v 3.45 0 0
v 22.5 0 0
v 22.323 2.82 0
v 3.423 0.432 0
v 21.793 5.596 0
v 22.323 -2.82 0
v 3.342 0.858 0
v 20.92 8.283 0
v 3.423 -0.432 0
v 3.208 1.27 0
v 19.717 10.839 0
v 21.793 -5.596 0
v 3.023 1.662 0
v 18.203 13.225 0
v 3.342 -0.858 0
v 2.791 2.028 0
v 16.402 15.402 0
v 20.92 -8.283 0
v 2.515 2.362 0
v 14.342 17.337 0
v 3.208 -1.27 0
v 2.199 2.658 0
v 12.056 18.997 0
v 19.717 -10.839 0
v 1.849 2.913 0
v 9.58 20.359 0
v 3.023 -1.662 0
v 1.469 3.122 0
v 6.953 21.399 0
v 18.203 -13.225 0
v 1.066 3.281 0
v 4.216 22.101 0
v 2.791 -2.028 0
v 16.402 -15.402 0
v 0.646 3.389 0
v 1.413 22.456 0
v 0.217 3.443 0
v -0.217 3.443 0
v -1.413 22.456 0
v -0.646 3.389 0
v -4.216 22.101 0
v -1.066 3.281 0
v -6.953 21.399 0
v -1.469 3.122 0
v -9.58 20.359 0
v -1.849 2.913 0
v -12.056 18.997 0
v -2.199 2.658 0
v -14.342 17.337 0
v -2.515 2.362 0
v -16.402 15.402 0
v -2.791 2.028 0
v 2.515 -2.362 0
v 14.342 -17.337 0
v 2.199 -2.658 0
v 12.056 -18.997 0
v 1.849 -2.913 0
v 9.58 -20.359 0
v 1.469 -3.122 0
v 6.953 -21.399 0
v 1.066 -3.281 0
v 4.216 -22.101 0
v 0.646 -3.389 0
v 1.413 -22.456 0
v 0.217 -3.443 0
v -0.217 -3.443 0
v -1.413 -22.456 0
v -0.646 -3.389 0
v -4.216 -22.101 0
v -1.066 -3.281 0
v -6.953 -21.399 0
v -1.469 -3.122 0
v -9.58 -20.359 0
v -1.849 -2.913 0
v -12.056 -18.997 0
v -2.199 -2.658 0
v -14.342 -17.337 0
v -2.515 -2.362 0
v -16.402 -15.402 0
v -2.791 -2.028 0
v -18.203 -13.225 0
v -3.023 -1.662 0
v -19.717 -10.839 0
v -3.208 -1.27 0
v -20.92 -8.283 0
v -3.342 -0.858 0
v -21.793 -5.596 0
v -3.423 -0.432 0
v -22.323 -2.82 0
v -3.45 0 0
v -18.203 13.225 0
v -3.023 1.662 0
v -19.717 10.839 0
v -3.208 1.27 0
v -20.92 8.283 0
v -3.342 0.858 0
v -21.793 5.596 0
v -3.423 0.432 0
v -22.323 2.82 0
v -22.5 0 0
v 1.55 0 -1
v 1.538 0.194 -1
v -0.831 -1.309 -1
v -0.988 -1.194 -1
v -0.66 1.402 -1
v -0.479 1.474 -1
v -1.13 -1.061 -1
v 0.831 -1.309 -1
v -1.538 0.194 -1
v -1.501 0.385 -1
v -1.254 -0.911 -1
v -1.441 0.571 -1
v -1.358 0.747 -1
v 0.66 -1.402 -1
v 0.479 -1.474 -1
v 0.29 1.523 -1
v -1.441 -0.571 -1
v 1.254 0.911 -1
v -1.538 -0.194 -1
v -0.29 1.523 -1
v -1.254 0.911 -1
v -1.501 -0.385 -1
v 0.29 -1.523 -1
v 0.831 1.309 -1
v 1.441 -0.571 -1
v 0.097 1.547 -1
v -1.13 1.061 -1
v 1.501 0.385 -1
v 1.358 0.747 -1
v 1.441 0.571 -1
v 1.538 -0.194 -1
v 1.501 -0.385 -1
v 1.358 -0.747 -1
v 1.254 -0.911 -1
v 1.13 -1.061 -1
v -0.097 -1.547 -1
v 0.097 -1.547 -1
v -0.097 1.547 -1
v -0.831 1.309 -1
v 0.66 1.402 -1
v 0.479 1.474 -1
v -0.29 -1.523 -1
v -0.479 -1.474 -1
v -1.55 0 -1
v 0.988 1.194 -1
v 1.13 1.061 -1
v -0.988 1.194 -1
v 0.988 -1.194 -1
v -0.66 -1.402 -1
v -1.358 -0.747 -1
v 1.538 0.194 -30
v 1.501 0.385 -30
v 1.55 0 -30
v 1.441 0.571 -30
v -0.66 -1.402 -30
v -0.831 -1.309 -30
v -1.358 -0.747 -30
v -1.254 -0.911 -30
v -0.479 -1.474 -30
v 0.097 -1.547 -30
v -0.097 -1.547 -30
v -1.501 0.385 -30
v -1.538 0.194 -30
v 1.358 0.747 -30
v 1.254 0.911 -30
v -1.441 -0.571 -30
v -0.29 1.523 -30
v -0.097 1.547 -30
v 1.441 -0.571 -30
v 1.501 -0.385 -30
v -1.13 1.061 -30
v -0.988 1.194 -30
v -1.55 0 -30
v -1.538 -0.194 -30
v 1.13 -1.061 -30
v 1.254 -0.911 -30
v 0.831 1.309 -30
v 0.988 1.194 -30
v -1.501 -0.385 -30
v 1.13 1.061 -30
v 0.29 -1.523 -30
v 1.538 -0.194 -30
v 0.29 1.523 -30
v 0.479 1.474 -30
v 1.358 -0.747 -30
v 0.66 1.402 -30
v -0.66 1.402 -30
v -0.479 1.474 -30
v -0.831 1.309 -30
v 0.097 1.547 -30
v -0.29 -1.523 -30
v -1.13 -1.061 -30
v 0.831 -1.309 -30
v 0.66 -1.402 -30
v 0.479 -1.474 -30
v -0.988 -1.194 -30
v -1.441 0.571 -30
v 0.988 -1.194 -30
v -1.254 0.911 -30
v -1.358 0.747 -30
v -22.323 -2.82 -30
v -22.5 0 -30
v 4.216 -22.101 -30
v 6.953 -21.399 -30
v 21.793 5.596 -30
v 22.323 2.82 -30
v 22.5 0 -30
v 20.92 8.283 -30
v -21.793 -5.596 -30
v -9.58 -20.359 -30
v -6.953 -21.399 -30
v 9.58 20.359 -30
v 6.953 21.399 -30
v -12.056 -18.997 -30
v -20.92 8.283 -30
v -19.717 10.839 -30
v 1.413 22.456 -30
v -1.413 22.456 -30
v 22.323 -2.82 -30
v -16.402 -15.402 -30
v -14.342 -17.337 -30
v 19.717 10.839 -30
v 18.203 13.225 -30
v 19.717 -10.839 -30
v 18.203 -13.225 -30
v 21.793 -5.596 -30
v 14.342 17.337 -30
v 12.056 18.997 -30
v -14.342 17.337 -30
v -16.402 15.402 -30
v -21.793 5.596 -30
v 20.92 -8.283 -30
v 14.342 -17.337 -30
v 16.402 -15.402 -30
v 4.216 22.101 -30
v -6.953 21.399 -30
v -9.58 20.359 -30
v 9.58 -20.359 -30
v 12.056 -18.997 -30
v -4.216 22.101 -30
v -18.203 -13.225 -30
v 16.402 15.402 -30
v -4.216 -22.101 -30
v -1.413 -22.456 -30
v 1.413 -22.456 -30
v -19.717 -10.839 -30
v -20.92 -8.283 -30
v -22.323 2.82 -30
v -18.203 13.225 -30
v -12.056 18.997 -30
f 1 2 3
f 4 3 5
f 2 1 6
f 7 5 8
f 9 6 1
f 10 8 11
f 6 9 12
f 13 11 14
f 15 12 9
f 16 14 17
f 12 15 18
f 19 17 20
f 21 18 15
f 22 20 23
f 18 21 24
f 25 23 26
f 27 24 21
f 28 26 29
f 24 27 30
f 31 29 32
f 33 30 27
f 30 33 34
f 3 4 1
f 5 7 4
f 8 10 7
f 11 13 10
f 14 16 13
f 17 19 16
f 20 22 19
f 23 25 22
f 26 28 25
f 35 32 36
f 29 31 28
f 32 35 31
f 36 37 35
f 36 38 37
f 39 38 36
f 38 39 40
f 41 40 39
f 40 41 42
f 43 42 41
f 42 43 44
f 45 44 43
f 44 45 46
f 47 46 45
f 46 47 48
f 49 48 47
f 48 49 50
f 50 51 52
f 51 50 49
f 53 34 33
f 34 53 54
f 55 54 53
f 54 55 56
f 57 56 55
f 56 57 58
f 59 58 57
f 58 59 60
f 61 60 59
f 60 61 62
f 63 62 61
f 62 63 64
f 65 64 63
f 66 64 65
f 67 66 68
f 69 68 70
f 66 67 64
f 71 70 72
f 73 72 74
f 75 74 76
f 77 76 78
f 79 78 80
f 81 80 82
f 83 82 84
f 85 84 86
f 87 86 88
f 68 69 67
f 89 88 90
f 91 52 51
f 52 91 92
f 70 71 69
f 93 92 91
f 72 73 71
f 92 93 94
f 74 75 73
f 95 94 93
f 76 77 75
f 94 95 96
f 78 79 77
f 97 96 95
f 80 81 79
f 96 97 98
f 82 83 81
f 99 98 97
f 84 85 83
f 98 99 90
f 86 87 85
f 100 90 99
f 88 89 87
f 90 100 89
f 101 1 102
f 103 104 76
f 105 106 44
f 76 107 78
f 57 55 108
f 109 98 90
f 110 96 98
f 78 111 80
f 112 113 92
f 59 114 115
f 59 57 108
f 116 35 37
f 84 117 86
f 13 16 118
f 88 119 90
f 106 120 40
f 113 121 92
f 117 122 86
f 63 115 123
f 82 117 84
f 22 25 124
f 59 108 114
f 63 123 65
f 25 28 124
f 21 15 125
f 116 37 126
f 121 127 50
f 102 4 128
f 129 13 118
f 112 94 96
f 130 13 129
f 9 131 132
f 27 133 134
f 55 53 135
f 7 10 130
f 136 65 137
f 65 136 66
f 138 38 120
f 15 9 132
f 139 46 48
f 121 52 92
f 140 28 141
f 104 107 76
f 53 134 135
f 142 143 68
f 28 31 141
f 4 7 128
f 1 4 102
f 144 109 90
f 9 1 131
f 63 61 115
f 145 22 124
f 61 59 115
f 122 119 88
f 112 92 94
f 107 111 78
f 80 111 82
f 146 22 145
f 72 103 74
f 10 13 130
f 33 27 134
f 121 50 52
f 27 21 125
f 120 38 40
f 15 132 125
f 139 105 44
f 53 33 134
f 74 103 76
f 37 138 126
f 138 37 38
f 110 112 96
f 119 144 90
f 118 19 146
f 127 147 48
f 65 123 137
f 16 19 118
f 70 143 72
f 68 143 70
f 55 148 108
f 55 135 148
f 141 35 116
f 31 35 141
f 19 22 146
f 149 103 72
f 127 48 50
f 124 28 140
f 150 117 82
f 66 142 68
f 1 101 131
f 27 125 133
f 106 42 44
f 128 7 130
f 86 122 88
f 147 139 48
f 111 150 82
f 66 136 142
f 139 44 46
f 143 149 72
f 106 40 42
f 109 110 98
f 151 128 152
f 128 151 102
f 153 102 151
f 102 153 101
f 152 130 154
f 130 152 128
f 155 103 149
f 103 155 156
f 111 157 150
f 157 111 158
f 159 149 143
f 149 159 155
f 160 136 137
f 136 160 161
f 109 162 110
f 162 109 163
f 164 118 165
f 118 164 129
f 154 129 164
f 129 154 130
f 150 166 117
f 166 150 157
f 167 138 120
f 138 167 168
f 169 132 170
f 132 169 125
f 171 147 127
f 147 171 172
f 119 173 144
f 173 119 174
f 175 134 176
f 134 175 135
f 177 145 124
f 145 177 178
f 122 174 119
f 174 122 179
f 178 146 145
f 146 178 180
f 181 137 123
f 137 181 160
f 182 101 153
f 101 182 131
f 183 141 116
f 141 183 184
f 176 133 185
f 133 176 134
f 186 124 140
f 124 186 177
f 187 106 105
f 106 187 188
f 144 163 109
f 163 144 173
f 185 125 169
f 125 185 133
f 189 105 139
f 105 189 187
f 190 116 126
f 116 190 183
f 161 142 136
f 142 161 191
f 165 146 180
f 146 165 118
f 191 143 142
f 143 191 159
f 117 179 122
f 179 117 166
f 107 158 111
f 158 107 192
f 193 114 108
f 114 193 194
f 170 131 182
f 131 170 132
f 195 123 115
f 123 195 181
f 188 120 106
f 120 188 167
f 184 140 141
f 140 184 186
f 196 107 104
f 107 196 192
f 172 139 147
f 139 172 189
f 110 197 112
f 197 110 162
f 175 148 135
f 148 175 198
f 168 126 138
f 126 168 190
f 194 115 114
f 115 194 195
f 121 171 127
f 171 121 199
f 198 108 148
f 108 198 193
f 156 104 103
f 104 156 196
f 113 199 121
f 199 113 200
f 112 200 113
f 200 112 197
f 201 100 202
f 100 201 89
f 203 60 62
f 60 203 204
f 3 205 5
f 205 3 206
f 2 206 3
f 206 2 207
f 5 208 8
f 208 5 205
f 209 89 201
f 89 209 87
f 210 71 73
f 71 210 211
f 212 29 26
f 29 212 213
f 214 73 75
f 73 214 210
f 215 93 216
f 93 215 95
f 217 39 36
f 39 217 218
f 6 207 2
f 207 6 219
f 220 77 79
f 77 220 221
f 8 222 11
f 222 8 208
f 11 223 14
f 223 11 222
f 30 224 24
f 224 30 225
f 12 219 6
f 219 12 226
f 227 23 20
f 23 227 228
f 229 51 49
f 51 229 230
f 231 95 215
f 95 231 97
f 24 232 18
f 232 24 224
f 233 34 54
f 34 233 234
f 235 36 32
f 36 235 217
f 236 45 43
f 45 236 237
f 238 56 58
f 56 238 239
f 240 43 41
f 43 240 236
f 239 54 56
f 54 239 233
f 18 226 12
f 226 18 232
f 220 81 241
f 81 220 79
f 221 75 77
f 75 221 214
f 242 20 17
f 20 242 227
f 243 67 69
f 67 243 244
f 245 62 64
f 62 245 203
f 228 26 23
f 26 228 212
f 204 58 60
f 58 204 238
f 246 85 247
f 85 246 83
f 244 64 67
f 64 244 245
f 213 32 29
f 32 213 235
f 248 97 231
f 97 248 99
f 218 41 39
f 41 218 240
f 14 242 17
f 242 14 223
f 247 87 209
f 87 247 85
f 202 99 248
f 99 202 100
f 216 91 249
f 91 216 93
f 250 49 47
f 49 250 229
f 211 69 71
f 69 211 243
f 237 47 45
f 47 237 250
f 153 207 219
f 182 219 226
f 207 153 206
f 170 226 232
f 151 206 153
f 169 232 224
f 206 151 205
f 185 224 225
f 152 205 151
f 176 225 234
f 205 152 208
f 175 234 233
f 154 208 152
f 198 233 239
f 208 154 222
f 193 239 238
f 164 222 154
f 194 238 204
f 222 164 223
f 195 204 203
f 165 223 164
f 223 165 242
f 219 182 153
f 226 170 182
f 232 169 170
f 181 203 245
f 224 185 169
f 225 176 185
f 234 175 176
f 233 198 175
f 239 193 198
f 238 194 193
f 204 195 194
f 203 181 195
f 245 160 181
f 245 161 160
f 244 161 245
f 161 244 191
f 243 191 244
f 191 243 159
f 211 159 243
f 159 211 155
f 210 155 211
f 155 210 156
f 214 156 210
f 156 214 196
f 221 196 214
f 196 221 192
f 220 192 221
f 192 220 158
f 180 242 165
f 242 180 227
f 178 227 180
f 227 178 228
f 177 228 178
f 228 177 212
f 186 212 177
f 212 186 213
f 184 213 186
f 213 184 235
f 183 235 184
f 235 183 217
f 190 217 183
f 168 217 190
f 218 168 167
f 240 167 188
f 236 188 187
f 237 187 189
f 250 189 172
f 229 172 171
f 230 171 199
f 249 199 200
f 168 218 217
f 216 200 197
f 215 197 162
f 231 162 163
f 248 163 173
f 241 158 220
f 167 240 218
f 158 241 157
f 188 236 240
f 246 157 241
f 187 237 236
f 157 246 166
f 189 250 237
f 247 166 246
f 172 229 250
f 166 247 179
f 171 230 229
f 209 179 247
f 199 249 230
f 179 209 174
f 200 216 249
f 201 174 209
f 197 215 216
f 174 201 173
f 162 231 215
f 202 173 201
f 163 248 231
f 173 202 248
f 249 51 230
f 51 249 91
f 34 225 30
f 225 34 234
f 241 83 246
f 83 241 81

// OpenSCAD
$fn = 50;

difference() {
	union() {
		translate(v = [0, 0, -30.0]) {
			cylinder(h = 30, r = 22.5);
		}
	}
	union() {
		translate(v = [0, 0, 0]) {
			rotate(a = [0, 0, 0]) {
				difference() {
					union() {
						translate(v = [0, 0, -33.0]) {
							cylinder(h = 33, r = 1.25);
						}
						translate(v = [0, 0, -1.0]) {
							cylinder(h = 1.0, r1 = 1.55, r2 = 3.45);
						}
						translate(v = [0, 0, -33.0]) {
							cylinder(h = 33, r = 1.55);
						}
						translate(v = [0, 0, -33.0]) {
							cylinder(h = 33, r = 1.25);
						}
					}
					union();
				}
			}
		}
	}
}
